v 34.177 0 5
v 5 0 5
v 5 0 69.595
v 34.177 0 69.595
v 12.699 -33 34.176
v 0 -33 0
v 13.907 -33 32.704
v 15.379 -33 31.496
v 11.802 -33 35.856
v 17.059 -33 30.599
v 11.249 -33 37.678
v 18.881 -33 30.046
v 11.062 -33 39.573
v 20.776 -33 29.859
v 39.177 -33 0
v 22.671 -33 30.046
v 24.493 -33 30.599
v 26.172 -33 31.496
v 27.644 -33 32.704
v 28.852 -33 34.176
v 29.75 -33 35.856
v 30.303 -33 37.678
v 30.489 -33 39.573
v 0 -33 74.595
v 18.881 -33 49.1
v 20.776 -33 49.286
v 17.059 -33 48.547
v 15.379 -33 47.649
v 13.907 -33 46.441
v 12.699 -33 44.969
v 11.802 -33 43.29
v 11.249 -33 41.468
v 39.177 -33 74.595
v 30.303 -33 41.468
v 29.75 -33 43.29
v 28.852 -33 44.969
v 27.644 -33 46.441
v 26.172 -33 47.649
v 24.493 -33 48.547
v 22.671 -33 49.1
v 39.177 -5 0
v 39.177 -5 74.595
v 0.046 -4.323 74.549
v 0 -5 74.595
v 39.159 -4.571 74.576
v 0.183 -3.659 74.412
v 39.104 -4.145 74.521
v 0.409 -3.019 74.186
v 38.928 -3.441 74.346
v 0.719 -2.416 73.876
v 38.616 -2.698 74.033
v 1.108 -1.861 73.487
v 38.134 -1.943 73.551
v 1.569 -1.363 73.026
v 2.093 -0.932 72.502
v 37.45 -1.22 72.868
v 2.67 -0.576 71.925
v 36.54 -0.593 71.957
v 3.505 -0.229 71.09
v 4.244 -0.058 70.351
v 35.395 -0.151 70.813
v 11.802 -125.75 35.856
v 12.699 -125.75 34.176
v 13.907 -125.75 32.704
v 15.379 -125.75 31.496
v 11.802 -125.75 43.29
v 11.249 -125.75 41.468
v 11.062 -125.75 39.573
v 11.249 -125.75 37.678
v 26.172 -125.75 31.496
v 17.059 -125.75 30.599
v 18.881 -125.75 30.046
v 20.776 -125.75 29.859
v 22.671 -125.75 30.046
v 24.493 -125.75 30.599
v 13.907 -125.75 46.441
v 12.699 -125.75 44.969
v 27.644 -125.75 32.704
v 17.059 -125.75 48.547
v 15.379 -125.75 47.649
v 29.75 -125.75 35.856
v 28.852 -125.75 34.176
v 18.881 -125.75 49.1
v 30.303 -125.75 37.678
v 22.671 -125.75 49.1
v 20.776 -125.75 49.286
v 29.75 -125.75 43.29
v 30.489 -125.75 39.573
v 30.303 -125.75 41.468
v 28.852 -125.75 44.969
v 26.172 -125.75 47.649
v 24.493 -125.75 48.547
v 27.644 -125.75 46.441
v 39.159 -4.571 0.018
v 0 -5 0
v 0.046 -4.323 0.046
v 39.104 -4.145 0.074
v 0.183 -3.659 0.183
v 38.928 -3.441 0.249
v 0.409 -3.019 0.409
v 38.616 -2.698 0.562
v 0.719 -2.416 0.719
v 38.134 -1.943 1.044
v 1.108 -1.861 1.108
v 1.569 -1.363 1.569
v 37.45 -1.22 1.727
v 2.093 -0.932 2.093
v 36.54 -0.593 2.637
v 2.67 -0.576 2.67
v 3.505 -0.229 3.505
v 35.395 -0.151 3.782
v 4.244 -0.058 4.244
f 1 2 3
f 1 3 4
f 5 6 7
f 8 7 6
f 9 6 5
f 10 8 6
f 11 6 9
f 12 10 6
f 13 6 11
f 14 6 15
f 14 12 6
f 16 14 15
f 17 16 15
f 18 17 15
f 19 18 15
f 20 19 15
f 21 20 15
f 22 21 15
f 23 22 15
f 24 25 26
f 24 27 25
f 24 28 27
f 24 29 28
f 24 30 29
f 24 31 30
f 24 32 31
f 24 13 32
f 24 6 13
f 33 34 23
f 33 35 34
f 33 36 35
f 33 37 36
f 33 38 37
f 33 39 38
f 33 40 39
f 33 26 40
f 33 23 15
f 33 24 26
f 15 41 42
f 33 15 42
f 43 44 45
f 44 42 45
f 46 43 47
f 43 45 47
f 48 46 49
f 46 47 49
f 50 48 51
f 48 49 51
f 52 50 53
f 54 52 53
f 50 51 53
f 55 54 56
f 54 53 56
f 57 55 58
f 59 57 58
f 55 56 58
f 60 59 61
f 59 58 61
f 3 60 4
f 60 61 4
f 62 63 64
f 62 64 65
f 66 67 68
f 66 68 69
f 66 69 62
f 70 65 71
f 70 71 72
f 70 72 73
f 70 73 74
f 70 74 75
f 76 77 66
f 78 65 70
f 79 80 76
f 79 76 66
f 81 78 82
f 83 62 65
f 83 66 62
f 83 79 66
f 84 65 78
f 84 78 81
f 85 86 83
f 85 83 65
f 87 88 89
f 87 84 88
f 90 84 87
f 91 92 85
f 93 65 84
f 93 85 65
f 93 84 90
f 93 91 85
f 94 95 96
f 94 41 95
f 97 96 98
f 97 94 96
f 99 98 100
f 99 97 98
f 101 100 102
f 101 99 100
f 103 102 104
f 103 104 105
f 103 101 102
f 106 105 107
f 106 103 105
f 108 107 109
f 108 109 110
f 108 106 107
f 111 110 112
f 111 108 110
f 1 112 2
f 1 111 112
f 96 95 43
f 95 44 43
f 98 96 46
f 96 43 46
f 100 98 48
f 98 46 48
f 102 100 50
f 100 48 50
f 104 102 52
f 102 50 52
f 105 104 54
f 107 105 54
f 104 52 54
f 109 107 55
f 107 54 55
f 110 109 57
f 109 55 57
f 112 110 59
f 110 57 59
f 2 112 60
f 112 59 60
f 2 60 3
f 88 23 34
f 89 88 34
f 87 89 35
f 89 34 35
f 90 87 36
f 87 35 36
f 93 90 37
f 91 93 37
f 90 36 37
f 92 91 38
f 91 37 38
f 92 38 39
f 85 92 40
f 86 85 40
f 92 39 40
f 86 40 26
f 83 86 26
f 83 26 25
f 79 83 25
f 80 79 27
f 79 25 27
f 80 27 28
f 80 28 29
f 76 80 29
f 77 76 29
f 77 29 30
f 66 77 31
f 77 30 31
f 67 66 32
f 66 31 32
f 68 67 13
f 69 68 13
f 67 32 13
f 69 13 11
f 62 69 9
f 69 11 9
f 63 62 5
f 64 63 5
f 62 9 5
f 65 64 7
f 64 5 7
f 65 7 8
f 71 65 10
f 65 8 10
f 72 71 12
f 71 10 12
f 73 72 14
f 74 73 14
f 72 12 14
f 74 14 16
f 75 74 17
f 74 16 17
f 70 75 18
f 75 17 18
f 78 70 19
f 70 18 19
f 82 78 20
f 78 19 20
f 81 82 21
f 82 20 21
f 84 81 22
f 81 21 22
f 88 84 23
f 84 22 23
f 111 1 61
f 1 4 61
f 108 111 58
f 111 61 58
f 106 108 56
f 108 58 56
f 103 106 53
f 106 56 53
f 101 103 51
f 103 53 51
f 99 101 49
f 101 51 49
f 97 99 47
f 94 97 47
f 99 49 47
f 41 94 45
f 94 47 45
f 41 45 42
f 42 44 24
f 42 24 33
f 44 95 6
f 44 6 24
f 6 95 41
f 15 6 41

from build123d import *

# Parameters (mm, degrees)
F0_W     = 39.177138
F0_H     = 74.594855
F1_DEPTH = 33
F2_R     = 9.713505
F3_DEPTH = 92.75
F4_R     = 5


with BuildPart() as f1:
    # F0 (on Front) → F1 (new body)
    with BuildSketch(Plane.XZ):
        with Locations((19.588569, 37.297427)):
            Rectangle(F0_W, F0_H)
    extrude(amount=F1_DEPTH)

    # F2 (on face) → F3 (join)
    with BuildSketch(Plane.XZ.offset(33)):
        with Locations((20.775756, 39.572868)):
            Circle(F2_R)
    extrude(amount=F3_DEPTH)

    # F4
    f4_edges = [f1.edges().sort_by_distance(p)[0] for p in [
        (39.177138, 0, 37.297428),
        (19.588569, 0, 74.594855),
        (0, 0, 37.297428),
        (19.588569, 0, 0),
    ]]
    fillet(f4_edges, radius=F4_R)


solid = f1.part
